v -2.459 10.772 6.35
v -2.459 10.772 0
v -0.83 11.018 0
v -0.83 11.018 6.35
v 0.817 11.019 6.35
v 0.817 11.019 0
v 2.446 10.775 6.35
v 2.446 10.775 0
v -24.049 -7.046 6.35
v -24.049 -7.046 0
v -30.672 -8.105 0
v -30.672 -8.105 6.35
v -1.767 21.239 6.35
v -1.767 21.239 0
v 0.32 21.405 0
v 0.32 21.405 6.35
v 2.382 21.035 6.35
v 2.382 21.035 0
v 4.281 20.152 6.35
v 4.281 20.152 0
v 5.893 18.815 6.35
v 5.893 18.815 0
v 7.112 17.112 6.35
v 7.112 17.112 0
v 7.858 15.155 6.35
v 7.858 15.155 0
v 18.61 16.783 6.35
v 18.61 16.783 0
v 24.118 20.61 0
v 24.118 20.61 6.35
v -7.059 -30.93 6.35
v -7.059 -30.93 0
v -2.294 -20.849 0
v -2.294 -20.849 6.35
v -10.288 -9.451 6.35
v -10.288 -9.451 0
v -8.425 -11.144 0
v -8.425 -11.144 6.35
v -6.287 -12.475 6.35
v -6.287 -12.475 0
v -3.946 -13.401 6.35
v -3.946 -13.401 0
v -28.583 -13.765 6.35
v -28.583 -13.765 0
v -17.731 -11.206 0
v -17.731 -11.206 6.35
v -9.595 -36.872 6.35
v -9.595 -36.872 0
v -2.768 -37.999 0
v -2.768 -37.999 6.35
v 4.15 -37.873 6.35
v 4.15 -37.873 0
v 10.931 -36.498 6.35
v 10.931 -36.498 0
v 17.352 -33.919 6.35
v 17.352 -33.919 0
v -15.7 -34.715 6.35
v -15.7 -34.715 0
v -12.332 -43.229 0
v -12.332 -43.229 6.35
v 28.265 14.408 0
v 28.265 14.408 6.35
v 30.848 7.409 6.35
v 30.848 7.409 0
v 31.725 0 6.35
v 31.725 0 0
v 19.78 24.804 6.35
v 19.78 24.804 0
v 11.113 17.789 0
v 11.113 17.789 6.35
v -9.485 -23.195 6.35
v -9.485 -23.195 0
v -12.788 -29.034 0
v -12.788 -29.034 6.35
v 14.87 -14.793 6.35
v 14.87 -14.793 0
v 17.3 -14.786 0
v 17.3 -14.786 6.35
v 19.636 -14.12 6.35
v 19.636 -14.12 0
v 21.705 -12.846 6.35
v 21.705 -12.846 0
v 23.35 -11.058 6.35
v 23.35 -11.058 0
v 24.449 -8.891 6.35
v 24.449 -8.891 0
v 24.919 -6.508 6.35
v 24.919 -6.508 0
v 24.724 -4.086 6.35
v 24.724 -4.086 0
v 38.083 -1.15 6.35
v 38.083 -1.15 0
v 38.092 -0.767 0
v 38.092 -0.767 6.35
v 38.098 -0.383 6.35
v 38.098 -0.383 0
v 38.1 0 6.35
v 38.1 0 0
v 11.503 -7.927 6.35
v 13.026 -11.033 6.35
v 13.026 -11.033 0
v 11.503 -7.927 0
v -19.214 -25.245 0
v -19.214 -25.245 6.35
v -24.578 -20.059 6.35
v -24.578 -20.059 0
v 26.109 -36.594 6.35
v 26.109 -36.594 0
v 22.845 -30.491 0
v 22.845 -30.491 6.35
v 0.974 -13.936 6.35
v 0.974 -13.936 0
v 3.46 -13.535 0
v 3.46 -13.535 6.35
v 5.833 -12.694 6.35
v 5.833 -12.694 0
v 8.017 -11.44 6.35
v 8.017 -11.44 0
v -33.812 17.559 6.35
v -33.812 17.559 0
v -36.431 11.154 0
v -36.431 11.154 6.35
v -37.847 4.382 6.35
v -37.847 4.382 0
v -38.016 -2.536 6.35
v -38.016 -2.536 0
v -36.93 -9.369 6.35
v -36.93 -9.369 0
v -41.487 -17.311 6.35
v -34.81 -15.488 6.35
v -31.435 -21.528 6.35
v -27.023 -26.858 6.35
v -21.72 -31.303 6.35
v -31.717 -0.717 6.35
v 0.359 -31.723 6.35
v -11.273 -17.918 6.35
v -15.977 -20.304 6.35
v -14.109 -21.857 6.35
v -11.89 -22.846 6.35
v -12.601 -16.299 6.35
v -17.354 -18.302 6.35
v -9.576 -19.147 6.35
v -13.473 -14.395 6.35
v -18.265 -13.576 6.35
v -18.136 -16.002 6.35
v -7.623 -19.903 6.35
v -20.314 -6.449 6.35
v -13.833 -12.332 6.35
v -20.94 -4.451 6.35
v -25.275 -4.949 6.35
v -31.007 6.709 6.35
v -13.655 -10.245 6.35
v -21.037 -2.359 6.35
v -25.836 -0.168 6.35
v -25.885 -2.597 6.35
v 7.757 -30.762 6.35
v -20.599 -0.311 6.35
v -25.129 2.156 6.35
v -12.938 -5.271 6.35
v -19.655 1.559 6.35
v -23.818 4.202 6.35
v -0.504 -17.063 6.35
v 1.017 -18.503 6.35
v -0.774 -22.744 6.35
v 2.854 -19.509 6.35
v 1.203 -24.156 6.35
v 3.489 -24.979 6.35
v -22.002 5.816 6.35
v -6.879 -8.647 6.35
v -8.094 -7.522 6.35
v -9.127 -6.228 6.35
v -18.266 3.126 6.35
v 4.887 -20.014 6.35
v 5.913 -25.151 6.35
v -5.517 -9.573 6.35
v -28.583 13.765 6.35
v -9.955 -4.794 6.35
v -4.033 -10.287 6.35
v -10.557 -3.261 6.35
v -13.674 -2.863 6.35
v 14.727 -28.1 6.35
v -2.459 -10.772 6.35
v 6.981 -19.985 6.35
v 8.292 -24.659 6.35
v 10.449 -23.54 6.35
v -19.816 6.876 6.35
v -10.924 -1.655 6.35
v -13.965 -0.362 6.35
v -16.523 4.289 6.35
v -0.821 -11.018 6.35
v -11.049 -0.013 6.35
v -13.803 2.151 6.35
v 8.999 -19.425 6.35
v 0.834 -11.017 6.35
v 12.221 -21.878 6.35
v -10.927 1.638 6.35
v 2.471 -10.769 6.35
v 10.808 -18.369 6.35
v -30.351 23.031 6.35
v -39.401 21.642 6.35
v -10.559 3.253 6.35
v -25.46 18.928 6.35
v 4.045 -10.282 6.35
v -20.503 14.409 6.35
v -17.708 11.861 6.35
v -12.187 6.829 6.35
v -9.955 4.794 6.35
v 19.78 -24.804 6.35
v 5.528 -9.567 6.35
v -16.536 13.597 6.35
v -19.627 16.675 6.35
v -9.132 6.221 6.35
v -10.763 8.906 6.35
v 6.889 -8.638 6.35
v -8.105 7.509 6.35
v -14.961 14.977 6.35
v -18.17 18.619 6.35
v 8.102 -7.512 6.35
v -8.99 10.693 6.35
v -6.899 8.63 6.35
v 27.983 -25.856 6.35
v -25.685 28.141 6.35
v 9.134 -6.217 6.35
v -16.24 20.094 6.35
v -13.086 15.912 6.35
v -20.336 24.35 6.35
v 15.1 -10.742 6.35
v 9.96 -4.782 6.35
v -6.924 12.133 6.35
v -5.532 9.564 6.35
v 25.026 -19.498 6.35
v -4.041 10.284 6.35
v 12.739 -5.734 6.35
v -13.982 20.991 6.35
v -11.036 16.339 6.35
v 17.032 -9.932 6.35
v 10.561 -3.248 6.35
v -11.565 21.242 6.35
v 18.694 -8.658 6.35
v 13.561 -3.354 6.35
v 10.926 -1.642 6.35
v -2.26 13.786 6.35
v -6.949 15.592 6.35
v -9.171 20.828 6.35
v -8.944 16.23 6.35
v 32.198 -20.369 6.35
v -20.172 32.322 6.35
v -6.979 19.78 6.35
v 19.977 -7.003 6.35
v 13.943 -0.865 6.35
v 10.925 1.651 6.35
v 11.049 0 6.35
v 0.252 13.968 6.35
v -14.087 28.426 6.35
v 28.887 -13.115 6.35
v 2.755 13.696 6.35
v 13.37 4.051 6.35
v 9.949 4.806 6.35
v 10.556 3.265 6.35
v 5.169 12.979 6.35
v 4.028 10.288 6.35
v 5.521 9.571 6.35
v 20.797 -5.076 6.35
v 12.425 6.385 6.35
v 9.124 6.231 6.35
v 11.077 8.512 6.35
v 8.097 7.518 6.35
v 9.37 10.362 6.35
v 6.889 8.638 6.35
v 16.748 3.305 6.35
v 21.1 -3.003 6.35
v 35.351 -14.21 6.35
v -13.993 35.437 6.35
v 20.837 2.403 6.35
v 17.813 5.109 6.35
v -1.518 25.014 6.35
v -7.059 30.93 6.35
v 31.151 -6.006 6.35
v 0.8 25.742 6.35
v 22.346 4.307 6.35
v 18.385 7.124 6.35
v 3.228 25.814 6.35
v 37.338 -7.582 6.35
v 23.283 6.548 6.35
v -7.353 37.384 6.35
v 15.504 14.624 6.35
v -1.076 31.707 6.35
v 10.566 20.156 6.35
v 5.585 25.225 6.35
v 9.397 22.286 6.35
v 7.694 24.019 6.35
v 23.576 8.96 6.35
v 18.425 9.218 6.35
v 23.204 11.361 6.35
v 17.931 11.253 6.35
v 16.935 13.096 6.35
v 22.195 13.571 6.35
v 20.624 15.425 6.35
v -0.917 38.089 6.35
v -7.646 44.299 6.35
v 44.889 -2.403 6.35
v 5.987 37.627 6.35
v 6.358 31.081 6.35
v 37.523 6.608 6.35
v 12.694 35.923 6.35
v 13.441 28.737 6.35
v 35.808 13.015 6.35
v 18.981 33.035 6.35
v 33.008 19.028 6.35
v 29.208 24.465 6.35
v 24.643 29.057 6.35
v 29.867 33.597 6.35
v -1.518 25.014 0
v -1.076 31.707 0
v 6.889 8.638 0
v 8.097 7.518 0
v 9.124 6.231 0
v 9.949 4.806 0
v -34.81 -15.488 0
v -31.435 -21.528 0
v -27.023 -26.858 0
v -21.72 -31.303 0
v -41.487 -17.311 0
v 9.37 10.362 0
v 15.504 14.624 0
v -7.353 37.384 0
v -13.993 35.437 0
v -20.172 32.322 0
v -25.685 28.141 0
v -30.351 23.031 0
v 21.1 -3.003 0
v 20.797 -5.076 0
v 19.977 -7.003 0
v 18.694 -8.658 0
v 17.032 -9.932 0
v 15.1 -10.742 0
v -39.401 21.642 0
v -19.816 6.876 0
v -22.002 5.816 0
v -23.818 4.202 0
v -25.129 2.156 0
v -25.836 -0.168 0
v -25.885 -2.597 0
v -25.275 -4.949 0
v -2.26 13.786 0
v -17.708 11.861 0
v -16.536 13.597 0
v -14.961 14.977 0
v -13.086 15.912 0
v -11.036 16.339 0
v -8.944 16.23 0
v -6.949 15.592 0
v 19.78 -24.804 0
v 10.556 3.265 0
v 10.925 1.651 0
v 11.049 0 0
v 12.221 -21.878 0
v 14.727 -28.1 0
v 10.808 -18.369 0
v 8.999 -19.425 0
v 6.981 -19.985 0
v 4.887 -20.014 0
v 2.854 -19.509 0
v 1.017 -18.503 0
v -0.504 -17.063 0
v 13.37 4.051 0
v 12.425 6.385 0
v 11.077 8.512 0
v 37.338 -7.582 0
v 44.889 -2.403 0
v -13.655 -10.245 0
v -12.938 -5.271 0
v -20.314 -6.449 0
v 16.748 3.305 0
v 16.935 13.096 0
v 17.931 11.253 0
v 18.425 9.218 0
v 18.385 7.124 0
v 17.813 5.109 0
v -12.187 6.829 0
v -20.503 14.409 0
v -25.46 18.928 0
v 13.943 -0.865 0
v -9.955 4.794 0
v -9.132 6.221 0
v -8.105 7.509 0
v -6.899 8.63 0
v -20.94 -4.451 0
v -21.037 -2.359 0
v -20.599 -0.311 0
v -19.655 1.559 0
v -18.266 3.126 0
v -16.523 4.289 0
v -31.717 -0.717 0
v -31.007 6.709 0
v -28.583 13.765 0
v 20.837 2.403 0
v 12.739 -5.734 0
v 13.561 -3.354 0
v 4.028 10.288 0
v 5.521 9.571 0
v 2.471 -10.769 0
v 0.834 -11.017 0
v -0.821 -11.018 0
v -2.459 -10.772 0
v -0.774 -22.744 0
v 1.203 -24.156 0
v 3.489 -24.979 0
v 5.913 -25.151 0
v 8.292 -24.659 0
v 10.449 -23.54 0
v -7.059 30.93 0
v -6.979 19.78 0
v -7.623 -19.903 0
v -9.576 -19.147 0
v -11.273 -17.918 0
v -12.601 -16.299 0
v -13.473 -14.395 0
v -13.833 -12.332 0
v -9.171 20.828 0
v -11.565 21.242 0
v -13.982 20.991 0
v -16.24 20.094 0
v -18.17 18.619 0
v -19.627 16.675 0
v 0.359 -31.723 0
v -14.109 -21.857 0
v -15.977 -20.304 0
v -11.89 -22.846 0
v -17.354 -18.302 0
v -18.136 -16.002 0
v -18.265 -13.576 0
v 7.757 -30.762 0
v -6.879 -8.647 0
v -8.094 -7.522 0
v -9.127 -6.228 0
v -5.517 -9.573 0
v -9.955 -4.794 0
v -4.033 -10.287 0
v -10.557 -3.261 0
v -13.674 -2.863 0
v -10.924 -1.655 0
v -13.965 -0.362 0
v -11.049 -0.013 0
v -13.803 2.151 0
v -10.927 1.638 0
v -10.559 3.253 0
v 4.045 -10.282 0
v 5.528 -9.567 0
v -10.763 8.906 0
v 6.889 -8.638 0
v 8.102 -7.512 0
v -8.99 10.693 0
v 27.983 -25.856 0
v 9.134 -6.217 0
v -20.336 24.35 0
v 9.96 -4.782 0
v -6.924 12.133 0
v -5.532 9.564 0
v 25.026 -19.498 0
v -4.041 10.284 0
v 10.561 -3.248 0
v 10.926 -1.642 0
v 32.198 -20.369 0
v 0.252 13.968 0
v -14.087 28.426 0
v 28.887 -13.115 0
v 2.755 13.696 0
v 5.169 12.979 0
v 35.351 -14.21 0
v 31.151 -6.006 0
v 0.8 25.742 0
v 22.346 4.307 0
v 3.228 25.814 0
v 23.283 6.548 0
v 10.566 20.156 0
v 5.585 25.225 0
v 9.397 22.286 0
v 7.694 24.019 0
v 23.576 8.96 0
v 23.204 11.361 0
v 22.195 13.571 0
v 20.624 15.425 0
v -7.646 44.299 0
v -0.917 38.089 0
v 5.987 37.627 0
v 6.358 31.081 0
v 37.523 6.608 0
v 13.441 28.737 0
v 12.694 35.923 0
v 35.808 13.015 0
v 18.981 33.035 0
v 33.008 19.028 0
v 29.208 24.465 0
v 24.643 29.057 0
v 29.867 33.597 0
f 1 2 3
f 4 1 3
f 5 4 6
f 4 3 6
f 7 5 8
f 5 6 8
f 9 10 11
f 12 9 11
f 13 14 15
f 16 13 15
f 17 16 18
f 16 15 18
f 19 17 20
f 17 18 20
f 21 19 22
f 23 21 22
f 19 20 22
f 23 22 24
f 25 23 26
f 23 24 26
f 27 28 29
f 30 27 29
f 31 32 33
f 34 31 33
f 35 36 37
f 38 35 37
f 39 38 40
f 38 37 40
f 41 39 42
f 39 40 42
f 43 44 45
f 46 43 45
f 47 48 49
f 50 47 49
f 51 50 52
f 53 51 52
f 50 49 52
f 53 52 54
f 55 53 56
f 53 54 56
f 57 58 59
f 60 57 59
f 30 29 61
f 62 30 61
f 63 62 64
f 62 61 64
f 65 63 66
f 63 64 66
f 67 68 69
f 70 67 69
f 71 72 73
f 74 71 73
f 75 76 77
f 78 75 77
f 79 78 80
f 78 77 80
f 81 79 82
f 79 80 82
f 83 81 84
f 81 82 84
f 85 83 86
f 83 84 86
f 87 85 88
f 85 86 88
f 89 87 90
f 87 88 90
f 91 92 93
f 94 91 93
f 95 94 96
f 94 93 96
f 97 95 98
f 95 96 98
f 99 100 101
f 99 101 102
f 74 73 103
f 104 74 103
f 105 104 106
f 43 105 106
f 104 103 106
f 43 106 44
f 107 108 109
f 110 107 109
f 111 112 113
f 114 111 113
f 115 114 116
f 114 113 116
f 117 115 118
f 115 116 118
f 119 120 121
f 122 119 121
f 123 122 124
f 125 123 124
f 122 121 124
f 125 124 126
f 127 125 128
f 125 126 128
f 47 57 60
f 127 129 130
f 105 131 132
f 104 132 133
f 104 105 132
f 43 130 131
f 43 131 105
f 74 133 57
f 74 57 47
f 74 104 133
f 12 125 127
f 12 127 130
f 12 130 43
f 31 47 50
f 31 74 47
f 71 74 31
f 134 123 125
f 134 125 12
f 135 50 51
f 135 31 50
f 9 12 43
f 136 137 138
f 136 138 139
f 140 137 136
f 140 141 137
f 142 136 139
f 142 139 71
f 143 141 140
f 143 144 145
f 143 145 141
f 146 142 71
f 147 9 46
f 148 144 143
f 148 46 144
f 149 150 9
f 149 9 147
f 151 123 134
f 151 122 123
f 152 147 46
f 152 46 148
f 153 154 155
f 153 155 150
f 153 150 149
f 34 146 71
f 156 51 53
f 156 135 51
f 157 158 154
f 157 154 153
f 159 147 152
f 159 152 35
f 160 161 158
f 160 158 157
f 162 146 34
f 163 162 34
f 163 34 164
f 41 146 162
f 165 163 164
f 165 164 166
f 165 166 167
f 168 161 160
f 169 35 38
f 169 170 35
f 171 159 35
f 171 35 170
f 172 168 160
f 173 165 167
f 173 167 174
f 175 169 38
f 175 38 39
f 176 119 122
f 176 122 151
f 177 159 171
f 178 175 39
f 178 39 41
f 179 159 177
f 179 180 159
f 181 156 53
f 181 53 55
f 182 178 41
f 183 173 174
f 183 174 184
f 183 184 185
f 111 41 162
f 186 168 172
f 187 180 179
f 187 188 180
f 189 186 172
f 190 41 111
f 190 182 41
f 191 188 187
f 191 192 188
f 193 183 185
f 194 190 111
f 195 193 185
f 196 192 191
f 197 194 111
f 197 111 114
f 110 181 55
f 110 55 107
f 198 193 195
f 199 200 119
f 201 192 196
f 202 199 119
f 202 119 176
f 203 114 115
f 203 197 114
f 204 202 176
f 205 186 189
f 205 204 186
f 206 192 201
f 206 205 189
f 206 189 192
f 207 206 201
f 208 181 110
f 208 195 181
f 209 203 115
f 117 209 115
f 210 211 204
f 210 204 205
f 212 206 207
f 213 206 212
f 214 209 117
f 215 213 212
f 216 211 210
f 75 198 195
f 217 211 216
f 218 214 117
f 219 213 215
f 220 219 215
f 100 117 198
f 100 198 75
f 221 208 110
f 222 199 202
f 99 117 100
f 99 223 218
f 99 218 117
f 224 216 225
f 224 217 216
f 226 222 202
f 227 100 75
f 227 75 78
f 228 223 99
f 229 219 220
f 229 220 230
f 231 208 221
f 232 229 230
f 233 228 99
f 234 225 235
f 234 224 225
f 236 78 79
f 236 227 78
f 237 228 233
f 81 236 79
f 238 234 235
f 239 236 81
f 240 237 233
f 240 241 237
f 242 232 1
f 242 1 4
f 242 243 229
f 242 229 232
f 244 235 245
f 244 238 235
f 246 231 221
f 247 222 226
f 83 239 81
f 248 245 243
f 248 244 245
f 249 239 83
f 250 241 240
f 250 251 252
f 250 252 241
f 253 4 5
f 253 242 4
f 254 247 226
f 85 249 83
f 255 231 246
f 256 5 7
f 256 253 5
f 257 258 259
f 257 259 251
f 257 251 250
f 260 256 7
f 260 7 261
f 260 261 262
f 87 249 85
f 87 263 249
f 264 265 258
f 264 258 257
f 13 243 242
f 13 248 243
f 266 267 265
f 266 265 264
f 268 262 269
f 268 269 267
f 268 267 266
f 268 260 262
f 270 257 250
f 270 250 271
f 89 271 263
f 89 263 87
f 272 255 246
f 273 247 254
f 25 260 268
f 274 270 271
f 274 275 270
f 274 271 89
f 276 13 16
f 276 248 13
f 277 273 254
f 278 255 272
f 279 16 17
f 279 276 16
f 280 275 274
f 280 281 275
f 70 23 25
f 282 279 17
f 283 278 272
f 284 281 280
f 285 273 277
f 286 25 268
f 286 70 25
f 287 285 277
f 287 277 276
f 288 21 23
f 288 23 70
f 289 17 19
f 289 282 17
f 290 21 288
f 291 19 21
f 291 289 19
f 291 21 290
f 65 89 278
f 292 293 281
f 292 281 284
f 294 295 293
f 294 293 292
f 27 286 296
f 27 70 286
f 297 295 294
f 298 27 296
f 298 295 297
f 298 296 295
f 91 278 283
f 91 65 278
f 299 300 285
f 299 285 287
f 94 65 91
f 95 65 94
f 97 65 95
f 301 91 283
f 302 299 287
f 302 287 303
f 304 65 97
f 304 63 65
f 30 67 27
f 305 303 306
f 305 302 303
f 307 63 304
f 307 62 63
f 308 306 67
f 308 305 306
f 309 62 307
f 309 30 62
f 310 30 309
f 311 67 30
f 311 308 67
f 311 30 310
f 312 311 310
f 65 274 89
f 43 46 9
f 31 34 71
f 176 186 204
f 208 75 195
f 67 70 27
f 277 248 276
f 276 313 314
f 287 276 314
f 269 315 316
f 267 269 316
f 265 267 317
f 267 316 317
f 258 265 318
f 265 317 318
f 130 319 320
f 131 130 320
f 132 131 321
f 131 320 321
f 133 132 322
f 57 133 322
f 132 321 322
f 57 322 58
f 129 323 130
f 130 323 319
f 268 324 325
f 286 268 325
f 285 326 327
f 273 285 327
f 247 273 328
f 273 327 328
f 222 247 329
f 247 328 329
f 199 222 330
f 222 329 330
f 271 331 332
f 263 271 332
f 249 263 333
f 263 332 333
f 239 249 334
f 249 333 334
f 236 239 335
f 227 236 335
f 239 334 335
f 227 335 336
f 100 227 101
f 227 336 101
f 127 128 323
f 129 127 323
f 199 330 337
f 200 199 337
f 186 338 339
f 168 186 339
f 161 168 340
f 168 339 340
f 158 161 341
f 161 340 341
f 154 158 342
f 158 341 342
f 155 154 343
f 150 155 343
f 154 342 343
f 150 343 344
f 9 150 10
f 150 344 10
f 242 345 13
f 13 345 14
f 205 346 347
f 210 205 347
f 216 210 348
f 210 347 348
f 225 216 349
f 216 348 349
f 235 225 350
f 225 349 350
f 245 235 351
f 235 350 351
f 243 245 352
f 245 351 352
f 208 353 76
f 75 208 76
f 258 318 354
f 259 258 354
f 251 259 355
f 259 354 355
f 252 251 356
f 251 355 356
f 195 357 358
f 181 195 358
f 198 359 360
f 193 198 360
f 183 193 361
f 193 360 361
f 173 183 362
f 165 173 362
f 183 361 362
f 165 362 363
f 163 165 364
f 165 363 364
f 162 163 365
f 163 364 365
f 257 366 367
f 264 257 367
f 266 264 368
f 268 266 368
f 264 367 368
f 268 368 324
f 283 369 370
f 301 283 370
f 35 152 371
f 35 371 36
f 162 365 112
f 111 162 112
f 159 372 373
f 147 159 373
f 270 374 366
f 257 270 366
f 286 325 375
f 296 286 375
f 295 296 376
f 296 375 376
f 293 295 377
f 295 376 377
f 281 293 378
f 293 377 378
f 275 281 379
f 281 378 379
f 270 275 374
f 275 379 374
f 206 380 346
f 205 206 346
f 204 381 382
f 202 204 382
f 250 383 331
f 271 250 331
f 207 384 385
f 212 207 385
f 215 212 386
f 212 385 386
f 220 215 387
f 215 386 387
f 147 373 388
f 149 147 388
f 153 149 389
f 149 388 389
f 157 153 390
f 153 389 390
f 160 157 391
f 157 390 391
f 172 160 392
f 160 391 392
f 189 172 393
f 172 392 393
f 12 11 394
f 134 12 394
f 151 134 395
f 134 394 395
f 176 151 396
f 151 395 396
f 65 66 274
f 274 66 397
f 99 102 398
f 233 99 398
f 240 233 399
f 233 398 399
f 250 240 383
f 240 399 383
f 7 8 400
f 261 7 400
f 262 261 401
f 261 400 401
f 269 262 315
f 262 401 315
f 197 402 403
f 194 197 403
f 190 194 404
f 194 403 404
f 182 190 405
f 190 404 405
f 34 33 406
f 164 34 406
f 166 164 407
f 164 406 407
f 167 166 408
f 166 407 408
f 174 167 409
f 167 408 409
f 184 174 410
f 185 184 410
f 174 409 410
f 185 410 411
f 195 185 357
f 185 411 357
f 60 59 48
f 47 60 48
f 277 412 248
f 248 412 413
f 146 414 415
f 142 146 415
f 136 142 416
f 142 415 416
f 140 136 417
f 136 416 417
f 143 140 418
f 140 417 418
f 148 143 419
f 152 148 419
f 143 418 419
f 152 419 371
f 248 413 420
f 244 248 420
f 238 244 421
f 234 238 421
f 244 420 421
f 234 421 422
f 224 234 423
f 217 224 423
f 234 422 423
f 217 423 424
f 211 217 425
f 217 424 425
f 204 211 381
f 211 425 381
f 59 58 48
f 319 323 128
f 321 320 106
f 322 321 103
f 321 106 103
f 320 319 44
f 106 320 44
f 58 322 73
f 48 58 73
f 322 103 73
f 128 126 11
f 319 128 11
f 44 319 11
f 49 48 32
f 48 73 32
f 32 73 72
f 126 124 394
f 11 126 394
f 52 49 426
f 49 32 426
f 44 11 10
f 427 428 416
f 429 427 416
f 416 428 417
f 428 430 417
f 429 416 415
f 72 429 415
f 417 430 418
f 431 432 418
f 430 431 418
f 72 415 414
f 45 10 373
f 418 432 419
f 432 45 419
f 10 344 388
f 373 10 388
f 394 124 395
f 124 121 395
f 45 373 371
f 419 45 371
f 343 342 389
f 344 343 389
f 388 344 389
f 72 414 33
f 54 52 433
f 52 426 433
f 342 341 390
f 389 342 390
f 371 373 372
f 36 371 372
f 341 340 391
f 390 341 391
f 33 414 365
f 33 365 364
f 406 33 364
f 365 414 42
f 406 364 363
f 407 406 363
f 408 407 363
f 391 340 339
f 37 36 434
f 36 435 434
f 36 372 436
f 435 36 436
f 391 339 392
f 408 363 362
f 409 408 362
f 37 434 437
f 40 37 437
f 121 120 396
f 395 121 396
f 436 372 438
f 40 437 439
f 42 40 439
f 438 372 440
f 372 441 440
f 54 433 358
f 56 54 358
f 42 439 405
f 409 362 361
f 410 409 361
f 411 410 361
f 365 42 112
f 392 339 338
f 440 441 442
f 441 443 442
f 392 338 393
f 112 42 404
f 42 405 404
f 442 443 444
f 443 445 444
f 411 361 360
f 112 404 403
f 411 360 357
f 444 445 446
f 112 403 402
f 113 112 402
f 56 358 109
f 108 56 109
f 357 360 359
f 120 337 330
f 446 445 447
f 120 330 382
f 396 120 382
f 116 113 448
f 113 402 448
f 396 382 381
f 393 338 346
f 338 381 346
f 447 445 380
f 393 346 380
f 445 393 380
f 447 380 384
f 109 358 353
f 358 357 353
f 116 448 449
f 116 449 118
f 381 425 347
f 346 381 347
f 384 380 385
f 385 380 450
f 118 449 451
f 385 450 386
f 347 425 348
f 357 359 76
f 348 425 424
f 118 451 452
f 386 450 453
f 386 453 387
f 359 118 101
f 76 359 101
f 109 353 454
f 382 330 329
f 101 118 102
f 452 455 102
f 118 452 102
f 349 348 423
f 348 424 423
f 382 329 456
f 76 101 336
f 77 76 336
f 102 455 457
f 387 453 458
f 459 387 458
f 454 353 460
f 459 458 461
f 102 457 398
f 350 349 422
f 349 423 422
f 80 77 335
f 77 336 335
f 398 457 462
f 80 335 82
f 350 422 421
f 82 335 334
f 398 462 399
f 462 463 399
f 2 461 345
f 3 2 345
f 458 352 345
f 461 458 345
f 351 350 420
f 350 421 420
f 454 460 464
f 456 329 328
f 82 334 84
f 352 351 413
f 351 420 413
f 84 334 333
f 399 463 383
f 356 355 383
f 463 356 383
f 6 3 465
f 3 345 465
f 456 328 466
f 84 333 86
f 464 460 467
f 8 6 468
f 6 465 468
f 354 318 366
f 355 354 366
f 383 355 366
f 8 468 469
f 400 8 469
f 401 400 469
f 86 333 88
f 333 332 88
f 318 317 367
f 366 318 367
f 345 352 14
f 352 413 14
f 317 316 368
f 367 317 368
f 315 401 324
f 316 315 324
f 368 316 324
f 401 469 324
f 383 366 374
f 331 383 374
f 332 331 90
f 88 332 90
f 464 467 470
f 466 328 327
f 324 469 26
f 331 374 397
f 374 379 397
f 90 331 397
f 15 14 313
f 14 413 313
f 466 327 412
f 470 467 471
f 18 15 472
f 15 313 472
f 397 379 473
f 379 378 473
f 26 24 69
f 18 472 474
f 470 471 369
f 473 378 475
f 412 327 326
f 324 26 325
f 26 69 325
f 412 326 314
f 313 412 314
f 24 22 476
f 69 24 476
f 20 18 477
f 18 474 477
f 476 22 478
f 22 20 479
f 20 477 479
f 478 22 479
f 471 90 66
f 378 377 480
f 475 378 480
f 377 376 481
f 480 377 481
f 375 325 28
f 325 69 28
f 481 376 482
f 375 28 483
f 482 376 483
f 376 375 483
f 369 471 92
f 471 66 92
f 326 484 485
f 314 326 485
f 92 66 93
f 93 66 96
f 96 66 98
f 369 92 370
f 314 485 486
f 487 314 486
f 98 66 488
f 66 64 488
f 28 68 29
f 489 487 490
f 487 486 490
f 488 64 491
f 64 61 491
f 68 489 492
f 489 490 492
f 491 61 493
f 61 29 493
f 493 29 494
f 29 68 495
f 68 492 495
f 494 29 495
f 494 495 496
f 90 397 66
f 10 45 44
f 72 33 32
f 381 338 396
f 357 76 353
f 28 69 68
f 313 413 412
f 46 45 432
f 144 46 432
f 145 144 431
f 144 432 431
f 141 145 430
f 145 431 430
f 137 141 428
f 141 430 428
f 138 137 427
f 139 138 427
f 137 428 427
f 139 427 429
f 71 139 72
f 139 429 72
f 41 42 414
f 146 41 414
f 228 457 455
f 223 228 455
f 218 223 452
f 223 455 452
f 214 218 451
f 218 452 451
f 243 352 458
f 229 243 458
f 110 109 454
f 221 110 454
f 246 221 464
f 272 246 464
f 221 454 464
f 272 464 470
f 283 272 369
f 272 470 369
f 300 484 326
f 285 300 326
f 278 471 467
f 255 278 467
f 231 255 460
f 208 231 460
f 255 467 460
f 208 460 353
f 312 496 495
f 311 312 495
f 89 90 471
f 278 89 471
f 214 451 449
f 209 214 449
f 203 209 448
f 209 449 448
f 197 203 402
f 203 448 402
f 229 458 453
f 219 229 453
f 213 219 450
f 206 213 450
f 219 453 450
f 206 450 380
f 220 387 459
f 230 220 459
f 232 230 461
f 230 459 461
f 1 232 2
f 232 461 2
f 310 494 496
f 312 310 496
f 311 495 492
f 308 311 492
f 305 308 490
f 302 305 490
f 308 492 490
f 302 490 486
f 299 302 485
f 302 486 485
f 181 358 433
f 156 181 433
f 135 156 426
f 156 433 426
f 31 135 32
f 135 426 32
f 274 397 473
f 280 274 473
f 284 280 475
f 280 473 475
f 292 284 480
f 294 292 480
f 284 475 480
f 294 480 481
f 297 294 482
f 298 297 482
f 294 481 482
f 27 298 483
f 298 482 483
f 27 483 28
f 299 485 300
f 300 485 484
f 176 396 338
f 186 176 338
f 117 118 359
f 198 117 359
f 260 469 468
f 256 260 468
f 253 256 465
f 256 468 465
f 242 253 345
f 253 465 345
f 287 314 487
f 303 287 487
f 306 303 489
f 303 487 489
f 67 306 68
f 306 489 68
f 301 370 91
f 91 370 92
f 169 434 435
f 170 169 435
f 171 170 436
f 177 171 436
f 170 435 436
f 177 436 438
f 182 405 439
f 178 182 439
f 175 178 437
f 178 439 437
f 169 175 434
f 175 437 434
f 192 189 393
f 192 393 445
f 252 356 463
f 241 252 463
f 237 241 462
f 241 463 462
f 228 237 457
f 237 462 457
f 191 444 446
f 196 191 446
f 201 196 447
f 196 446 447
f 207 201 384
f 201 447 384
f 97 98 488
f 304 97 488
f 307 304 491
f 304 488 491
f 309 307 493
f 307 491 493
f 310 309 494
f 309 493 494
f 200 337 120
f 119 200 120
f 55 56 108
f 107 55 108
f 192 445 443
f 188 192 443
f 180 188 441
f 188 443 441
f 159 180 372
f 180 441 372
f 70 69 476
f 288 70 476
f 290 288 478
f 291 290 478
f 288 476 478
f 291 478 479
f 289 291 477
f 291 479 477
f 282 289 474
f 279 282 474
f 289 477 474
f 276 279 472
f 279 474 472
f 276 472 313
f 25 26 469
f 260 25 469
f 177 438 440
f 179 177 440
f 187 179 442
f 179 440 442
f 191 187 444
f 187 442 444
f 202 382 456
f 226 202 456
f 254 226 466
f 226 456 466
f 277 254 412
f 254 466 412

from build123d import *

# Parameters (mm, degrees)
F1_DEPTH = 6.35


with BuildPart() as f1:
    # F0 (on Top) → F1 (new body)
    with BuildSketch(Plane.XY):
        with BuildLine():
            ThreePointArc((38.082651, -1.149654), (38.095662, -0.574892), (38.1, 0))
            ThreePointArc((38.1, 0), (35.807983, 13.015313), (29.207696, 24.464678))
            ThreePointArc((29.207696, 24.464678), (27.023086, 26.858199), (24.64298, 29.057418))
            ThreePointArc((24.64298, 29.057418), (12.693623, 35.923278), (-0.916555, 38.088974))
            ThreePointArc((-0.916555, 38.088974), (-4.149967, 37.873312), (-7.353357, 37.383661))
            ThreePointArc((-7.353357, 37.383661), (-20.171605, 32.322072), (-30.350621, 23.031496))
            ThreePointArc((-30.350621, 23.031496), (-32.19801, 20.369049), (-33.812467, 17.559245))
            ThreePointArc((-33.812467, 17.559245), (-37.847204, 4.381686), (-36.930051, -9.369169))
            ThreePointArc((-36.930051, -9.369169), (-36.000295, -12.473524), (-34.810099, -15.487641))
            ThreePointArc((-34.810099, -15.487641), (-27.023086, -26.858199), (-15.700399, -34.714658))
            ThreePointArc((-15.700399, -34.714658), (-12.693623, -35.923278), (-9.595017, -36.872017))
            ThreePointArc((-9.595017, -36.872017), (4.149967, -37.873312), (17.351974, -33.919302))
            ThreePointArc((17.351974, -33.919302), (20.171605, -32.322072), (22.845309, -30.491013))
            ThreePointArc((22.845309, -30.491013), (32.19801, -20.369049), (37.337956, -7.582019))
            ThreePointArc((37.337956, -7.582019), (37.847204, -4.381686), (38.082651, -1.149654))
        make_face()
        with BuildLine():
            ThreePointArc((31.72503, 0), (31.581265, -3.016833), (31.15127, -6.006323))
            ThreePointArc((31.15127, -6.006323), (27.144782, -16.420669), (19.780233, -24.803628))
            ThreePointArc((19.780233, -24.803628), (17.331942, -26.572191), (14.726567, -28.099925))
            ThreePointArc((14.726567, -28.099925), (4.086298, -31.460765), (-7.059483, -30.929618))
            ThreePointArc((-7.059483, -30.929618), (-9.968687, -30.118148), (-12.787542, -29.03371))
            ThreePointArc((-12.787542, -29.03371), (-22.049251, -22.810263), (-28.583265, -13.764975))
            ThreePointArc((-28.583265, -13.764975), (-29.762691, -10.984525), (-30.672371, -8.10452))
            ThreePointArc((-30.672371, -8.10452), (-31.581265, 3.016833), (-28.583265, 13.764975))
            ThreePointArc((-28.583265, 13.764975), (-27.144782, 16.420669), (-25.460279, 18.927539))
            ThreePointArc((-25.460279, 18.927539), (-17.331942, 26.572191), (-7.059483, 30.929618))
            ThreePointArc((-7.059483, 30.929618), (-4.086298, 31.460765), (-1.076078, 31.706775))
            ThreePointArc((-1.076078, 31.706775), (9.968687, 30.118148), (19.780233, 24.803628))
            ThreePointArc((19.780233, 24.803628), (22.049251, 22.810263), (24.118432, 20.610163))
            ThreePointArc((24.118432, 20.610163), (29.762691, 10.984525), (31.72503, 0))
        make_face(mode=Mode.SUBTRACT)
        with BuildLine():
            Line((-13.655153, -10.244662), (-10.288144, -9.450661))
            ThreePointArc((-10.288144, -9.450661), (-11.79945, -7.478896), (-12.937601, -5.270614))
            Line((-12.937601, -5.270614), (-20.313588, -6.449251))
            Line((-20.313588, -6.449251), (-24.048707, -7.046099))
            Line((-24.048707, -7.046099), (-30.672371, -8.10452))
            ThreePointArc((-30.672371, -8.10452), (-29.762691, -10.984525), (-28.583265, -13.764975))
            Line((-28.583265, -13.764975), (-17.730962, -11.205809))
            Line((-17.730962, -11.205809), (-13.655153, -10.244662))
        make_face()
        with BuildLine():
            ThreePointArc((-13.803377, 2.151204), (-13.204073, 4.562166), (-12.187194, 6.82885))
            Line((-12.187194, 6.82885), (-17.707542, 11.86076))
            Line((-17.707542, 11.86076), (-20.502986, 14.408865))
            Line((-20.502986, 14.408865), (-25.460279, 18.927539))
            ThreePointArc((-25.460279, 18.927539), (-27.144782, 16.420669), (-28.583265, 13.764975))
            Line((-28.583265, 13.764975), (-19.816128, 6.875916))
            Line((-19.816128, 6.875916), (-16.523448, 4.288587))
            Line((-16.523448, 4.288587), (-13.803377, 2.151204))
        make_face()
        with BuildLine():
            ThreePointArc((-6.924386, 12.133169), (-4.66576, 13.167824), (-2.259581, 13.786051))
            Line((-2.259581, 13.786051), (-1.767356, 21.239377))
            Line((-1.767356, 21.239377), (-1.518098, 25.01366))
            Line((-1.518098, 25.01366), (-1.076078, 31.706775))
            ThreePointArc((-1.076078, 31.706775), (-4.086298, 31.460765), (-7.059483, 30.929618))
            Line((-7.059483, 30.929618), (-6.979346, 19.779937))
            Line((-6.979346, 19.779937), (-6.949249, 15.592442))
            Line((-6.949249, 15.592442), (-6.924386, 12.133169))
        make_face()
        with BuildLine():
            ThreePointArc((5.168809, 12.97861), (7.385965, 11.857842), (9.369542, 10.362074))
            Line((9.369542, 10.362074), (15.503685, 14.624309))
            Line((15.503685, 14.624309), (18.609948, 16.782659))
            Line((18.609948, 16.782659), (24.118432, 20.610163))
            ThreePointArc((24.118432, 20.610163), (22.049251, 22.810263), (19.780233, 24.803628))
            Line((19.780233, 24.803628), (11.113026, 17.789261))
            Line((11.113026, 17.789261), (7.857876, 15.15487))
            Line((7.857876, 15.15487), (5.168809, 12.97861))
        make_face()
        with BuildLine():
            ThreePointArc((13.97, 0), (13.963301, -0.432585), (13.94321, -0.864756))
            Line((13.94321, -0.864756), (21.100135, -3.003161))
            Line((21.100135, -3.003161), (24.724324, -4.086027))
            Line((24.724324, -4.086027), (31.15127, -6.006323))
            ThreePointArc((31.15127, -6.006323), (31.581265, -3.016833), (31.72503, 0))
            Line((31.72503, 0), (20.837063, 2.402909))
            Line((20.837063, 2.402909), (16.74786, 3.305372))
            Line((16.74786, 3.305372), (13.369786, 4.050893))
            ThreePointArc((13.369786, 4.050893), (13.819132, 2.047559), (13.97, 0))
        make_face()
        with BuildLine():
            Line((13.026364, -11.033138), (11.503041, -7.927229))
            ThreePointArc((11.503041, -7.927229), (9.917009, -9.839402), (8.017356, -11.440407))
            Line((8.017356, -11.440407), (10.807753, -18.36919))
            Line((10.807753, -18.36919), (12.22078, -21.877851))
            Line((12.22078, -21.877851), (14.726567, -28.099925))
            ThreePointArc((14.726567, -28.099925), (17.331942, -26.572191), (19.780233, -24.803628))
            Line((19.780233, -24.803628), (14.870367, -14.792882))
            Line((14.870367, -14.792882), (13.026364, -11.033138))
        make_face()
        with BuildLine():
            Line((-0.50425, -17.063471), (0.974272, -13.935986))
            ThreePointArc((0.974272, -13.935986), (-1.5096, -13.888197), (-3.945731, -13.401198))
            Line((-3.945731, -13.401198), (-7.623088, -19.902844))
            Line((-7.623088, -19.902844), (-9.485261, -23.195207))
            Line((-9.485261, -23.195207), (-12.787542, -29.03371))
            ThreePointArc((-12.787542, -29.03371), (-9.968687, -30.118148), (-7.059483, -30.929618))
            Line((-7.059483, -30.929618), (-2.294019, -20.849332))
            Line((-2.294019, -20.849332), (-0.50425, -17.063471))
        make_face()
        with BuildLine():
            ThreePointArc((-6.899209, 8.630256), (-4.799901, 9.951952), (-2.458634, 10.771979))
            Line((-2.458634, 10.771979), (-2.259581, 13.786051))
            ThreePointArc((-2.259581, 13.786051), (-4.66576, 13.167824), (-6.924386, 12.133169))
            Line((-6.924386, 12.133169), (-6.899209, 8.630256))
        make_face()
        with BuildLine():
            ThreePointArc((-11.048992, -0.013142), (-10.773439, 2.452227), (-9.954805, 4.793981))
            Line((-9.954805, 4.793981), (-12.187194, 6.82885))
            ThreePointArc((-12.187194, 6.82885), (-13.204073, 4.562166), (-13.803377, 2.151204))
            Line((-13.803377, 2.151204), (-11.048992, -0.013142))
        make_face()
        with BuildLine():
            Line((-10.288144, -9.450661), (-6.878659, -8.646644))
            ThreePointArc((-6.878659, -8.646644), (-8.634357, -6.894075), (-9.954805, -4.793981))
            Line((-9.954805, -4.793981), (-12.937601, -5.270614))
            ThreePointArc((-12.937601, -5.270614), (-11.79945, -7.478896), (-10.288144, -9.450661))
        make_face()
        with BuildLine():
            Line((0.974272, -13.935986), (2.471445, -10.769046))
            ThreePointArc((2.471445, -10.769046), (0.006571, -11.048998), (-2.458634, -10.771979))
            Line((-2.458634, -10.771979), (-3.945731, -13.401198))
            ThreePointArc((-3.945731, -13.401198), (-1.5096, -13.888197), (0.974272, -13.935986))
        make_face()
        with BuildLine():
            Line((11.503041, -7.927229), (9.9605, -4.782137))
            ThreePointArc((9.9605, -4.782137), (8.642552, -6.8838), (6.888939, -8.638456))
            Line((6.888939, -8.638456), (8.017356, -11.440407))
            ThreePointArc((8.017356, -11.440407), (9.917009, -9.839402), (11.503041, -7.927229))
        make_face()
        with BuildLine():
            ThreePointArc((9.949096, 4.805819), (10.770514, 2.46504), (11.049, 0))
            Line((11.049, 0), (13.94321, -0.864756))
            ThreePointArc((13.94321, -0.864756), (13.963301, -0.432585), (13.97, 0))
            ThreePointArc((13.97, 0), (13.819132, 2.047559), (13.369786, 4.050893))
            Line((13.369786, 4.050893), (9.949096, 4.805819))
        make_face()
        with BuildLine():
            ThreePointArc((2.445819, 10.774895), (4.78806, 9.957654), (6.888939, 8.638456))
            Line((6.888939, 8.638456), (9.369542, 10.362074))
            ThreePointArc((9.369542, 10.362074), (7.385965, 11.857842), (5.168809, 12.97861))
            Line((5.168809, 12.97861), (2.445819, 10.774895))
        make_face()
        with BuildLine():
            ThreePointArc((-34.810099, -15.487641), (-36.000295, -12.473524), (-36.930051, -9.369169))
            Line((-36.930051, -9.369169), (-41.486686, -17.311361))
            Line((-41.486686, -17.311361), (-34.810099, -15.487641))
        make_face()
        with BuildLine():
            ThreePointArc((-33.812467, 17.559245), (-32.19801, 20.369049), (-30.350621, 23.031496))
            Line((-30.350621, 23.031496), (-39.401093, 21.64214))
            Line((-39.401093, 21.64214), (-33.812467, 17.559245))
        make_face()
        with BuildLine():
            ThreePointArc((-7.353357, 37.383661), (-4.149967, 37.873312), (-0.916555, 38.088974))
            Line((-0.916555, 38.088974), (-7.645673, 44.298669))
            Line((-7.645673, 44.298669), (-7.353357, 37.383661))
        make_face()
        with BuildLine():
            ThreePointArc((24.64298, 29.057418), (27.023086, 26.858199), (29.207696, 24.464678))
            Line((29.207696, 24.464678), (29.867095, 33.597396))
            Line((29.867095, 33.597396), (24.64298, 29.057418))
        make_face()
        with BuildLine():
            Line((44.889331, -2.403401), (38.082651, -1.149654))
            ThreePointArc((38.082651, -1.149654), (37.847204, -4.381686), (37.337956, -7.582019))
            Line((37.337956, -7.582019), (44.889331, -2.403401))
        make_face()
        with BuildLine():
            Line((26.108985, -36.594388), (22.845309, -30.491013))
            ThreePointArc((22.845309, -30.491013), (20.171605, -32.322072), (17.351974, -33.919302))
            Line((17.351974, -33.919302), (26.108985, -36.594388))
        make_face()
        with BuildLine():
            Line((-12.331959, -43.229055), (-9.595017, -36.872017))
            ThreePointArc((-9.595017, -36.872017), (-12.693623, -35.923278), (-15.700399, -34.714658))
            Line((-15.700399, -34.714658), (-12.331959, -43.229055))
        make_face()
        with BuildLine():
            ThreePointArc((-17.707542, 11.86076), (-13.086324, 15.91168), (-6.949249, 15.592442))
            Line((-6.949249, 15.592442), (-6.979346, 19.779937))
            ThreePointArc((-6.979346, 19.779937), (-15.14156, 20.620406), (-20.502986, 14.408865))
            Line((-20.502986, 14.408865), (-17.707542, 11.86076))
        make_face()
        with BuildLine():
            ThreePointArc((-1.767356, 21.239377), (4.281063, 20.152071), (7.857876, 15.15487))
            Line((7.857876, 15.15487), (11.113026, 17.789261))
            ThreePointArc((11.113026, 17.789261), (6.681074, 24.694761), (-1.518098, 25.01366))
            Line((-1.518098, 25.01366), (-1.767356, 21.239377))
        make_face()
        with BuildLine():
            ThreePointArc((15.503685, 14.624309), (18.424722, 9.217541), (16.74786, 3.305372))
            Line((16.74786, 3.305372), (20.837063, 2.402909))
            ThreePointArc((20.837063, 2.402909), (23.472724, 10.173458), (18.609948, 16.782659))
            Line((18.609948, 16.782659), (15.503685, 14.624309))
        make_face()
        with BuildLine():
            Line((24.724324, -4.086027), (21.100135, -3.003161))
            ThreePointArc((21.100135, -3.003161), (18.69419, -8.657985), (13.026364, -11.033138))
            Line((13.026364, -11.033138), (14.870367, -14.792882))
            ThreePointArc((14.870367, -14.792882), (22.588933, -12.008667), (24.724324, -4.086027))
        make_face()
        with BuildLine():
            Line((-24.048707, -7.046099), (-20.313588, -6.449251))
            ThreePointArc((-20.313588, -6.449251), (-20.599442, -0.31053), (-16.523448, 4.288587))
            Line((-16.523448, 4.288587), (-19.816128, 6.875916))
            ThreePointArc((-19.816128, 6.875916), (-25.562291, 1.018464), (-24.048707, -7.046099))
        make_face()
        with BuildLine():
            Line((12.22078, -21.877851), (10.807753, -18.36919))
            ThreePointArc((10.807753, -18.36919), (4.886551, -20.013872), (-0.50425, -17.063471))
            Line((-0.50425, -17.063471), (-2.294019, -20.849332))
            ThreePointArc((-2.294019, -20.849332), (4.695216, -25.148021), (12.22078, -21.877851))
        make_face()
        with BuildLine():
            Line((-9.485261, -23.195207), (-7.623088, -19.902844))
            ThreePointArc((-7.623088, -19.902844), (-12.60076, -16.298905), (-13.655153, -10.244662))
            Line((-13.655153, -10.244662), (-17.730962, -11.205809))
            ThreePointArc((-17.730962, -11.205809), (-16.734095, -19.350402), (-9.485261, -23.195207))
        make_face()
        with BuildLine():
            Line((-12.937601, -5.270614), (-9.954805, -4.793981))
            ThreePointArc((-9.954805, -4.793981), (-10.770514, -2.46504), (-11.048992, -0.013142))
            Line((-11.048992, -0.013142), (-13.803377, 2.151204))
            ThreePointArc((-13.803377, 2.151204), (-13.875908, -1.618663), (-12.937601, -5.270614))
        make_face()
        with BuildLine():
            Line((-3.945731, -13.401198), (-2.458634, -10.771979))
            ThreePointArc((-2.458634, -10.771979), (-4.78806, -9.957654), (-6.878659, -8.646644))
            Line((-6.878659, -8.646644), (-10.288144, -9.450661))
            ThreePointArc((-10.288144, -9.450661), (-7.385965, -11.857842), (-3.945731, -13.401198))
        make_face()
        with BuildLine():
            Line((8.017356, -11.440407), (6.888939, -8.638456))
            ThreePointArc((6.888939, -8.638456), (4.799901, -9.951952), (2.471445, -10.769046))
            Line((2.471445, -10.769046), (0.974272, -13.935986))
            ThreePointArc((0.974272, -13.935986), (4.66576, -13.167824), (8.017356, -11.440407))
        make_face()
        with BuildLine():
            Line((13.94321, -0.864756), (11.049, 0))
            ThreePointArc((11.049, 0), (10.773439, -2.452227), (9.9605, -4.782137))
            Line((9.9605, -4.782137), (11.503041, -7.927229))
            ThreePointArc((11.503041, -7.927229), (13.204073, -4.562166), (13.94321, -0.864756))
        make_face()
        with BuildLine():
            ThreePointArc((6.888939, 8.638456), (8.634357, 6.894075), (9.949096, 4.805819))
            Line((9.949096, 4.805819), (13.369786, 4.050893))
            ThreePointArc((13.369786, 4.050893), (11.79945, 7.478896), (9.369542, 10.362074))
            Line((9.369542, 10.362074), (6.888939, 8.638456))
        make_face()
        with BuildLine():
            ThreePointArc((-2.458634, 10.771979), (-0.006571, 11.048998), (2.445819, 10.774895))
            Line((2.445819, 10.774895), (5.168809, 12.97861))
            ThreePointArc((5.168809, 12.97861), (1.5096, 13.888197), (-2.259581, 13.786051))
            Line((-2.259581, 13.786051), (-2.458634, 10.771979))
        make_face()
        with BuildLine():
            ThreePointArc((-9.954805, 4.793981), (-8.642552, 6.8838), (-6.899209, 8.630256))
            Line((-6.899209, 8.630256), (-6.924386, 12.133169))
            ThreePointArc((-6.924386, 12.133169), (-9.917009, 9.839402), (-12.187194, 6.82885))
            Line((-12.187194, 6.82885), (-9.954805, 4.793981))
        make_face()
    extrude(amount=F1_DEPTH)


solid = f1.part
